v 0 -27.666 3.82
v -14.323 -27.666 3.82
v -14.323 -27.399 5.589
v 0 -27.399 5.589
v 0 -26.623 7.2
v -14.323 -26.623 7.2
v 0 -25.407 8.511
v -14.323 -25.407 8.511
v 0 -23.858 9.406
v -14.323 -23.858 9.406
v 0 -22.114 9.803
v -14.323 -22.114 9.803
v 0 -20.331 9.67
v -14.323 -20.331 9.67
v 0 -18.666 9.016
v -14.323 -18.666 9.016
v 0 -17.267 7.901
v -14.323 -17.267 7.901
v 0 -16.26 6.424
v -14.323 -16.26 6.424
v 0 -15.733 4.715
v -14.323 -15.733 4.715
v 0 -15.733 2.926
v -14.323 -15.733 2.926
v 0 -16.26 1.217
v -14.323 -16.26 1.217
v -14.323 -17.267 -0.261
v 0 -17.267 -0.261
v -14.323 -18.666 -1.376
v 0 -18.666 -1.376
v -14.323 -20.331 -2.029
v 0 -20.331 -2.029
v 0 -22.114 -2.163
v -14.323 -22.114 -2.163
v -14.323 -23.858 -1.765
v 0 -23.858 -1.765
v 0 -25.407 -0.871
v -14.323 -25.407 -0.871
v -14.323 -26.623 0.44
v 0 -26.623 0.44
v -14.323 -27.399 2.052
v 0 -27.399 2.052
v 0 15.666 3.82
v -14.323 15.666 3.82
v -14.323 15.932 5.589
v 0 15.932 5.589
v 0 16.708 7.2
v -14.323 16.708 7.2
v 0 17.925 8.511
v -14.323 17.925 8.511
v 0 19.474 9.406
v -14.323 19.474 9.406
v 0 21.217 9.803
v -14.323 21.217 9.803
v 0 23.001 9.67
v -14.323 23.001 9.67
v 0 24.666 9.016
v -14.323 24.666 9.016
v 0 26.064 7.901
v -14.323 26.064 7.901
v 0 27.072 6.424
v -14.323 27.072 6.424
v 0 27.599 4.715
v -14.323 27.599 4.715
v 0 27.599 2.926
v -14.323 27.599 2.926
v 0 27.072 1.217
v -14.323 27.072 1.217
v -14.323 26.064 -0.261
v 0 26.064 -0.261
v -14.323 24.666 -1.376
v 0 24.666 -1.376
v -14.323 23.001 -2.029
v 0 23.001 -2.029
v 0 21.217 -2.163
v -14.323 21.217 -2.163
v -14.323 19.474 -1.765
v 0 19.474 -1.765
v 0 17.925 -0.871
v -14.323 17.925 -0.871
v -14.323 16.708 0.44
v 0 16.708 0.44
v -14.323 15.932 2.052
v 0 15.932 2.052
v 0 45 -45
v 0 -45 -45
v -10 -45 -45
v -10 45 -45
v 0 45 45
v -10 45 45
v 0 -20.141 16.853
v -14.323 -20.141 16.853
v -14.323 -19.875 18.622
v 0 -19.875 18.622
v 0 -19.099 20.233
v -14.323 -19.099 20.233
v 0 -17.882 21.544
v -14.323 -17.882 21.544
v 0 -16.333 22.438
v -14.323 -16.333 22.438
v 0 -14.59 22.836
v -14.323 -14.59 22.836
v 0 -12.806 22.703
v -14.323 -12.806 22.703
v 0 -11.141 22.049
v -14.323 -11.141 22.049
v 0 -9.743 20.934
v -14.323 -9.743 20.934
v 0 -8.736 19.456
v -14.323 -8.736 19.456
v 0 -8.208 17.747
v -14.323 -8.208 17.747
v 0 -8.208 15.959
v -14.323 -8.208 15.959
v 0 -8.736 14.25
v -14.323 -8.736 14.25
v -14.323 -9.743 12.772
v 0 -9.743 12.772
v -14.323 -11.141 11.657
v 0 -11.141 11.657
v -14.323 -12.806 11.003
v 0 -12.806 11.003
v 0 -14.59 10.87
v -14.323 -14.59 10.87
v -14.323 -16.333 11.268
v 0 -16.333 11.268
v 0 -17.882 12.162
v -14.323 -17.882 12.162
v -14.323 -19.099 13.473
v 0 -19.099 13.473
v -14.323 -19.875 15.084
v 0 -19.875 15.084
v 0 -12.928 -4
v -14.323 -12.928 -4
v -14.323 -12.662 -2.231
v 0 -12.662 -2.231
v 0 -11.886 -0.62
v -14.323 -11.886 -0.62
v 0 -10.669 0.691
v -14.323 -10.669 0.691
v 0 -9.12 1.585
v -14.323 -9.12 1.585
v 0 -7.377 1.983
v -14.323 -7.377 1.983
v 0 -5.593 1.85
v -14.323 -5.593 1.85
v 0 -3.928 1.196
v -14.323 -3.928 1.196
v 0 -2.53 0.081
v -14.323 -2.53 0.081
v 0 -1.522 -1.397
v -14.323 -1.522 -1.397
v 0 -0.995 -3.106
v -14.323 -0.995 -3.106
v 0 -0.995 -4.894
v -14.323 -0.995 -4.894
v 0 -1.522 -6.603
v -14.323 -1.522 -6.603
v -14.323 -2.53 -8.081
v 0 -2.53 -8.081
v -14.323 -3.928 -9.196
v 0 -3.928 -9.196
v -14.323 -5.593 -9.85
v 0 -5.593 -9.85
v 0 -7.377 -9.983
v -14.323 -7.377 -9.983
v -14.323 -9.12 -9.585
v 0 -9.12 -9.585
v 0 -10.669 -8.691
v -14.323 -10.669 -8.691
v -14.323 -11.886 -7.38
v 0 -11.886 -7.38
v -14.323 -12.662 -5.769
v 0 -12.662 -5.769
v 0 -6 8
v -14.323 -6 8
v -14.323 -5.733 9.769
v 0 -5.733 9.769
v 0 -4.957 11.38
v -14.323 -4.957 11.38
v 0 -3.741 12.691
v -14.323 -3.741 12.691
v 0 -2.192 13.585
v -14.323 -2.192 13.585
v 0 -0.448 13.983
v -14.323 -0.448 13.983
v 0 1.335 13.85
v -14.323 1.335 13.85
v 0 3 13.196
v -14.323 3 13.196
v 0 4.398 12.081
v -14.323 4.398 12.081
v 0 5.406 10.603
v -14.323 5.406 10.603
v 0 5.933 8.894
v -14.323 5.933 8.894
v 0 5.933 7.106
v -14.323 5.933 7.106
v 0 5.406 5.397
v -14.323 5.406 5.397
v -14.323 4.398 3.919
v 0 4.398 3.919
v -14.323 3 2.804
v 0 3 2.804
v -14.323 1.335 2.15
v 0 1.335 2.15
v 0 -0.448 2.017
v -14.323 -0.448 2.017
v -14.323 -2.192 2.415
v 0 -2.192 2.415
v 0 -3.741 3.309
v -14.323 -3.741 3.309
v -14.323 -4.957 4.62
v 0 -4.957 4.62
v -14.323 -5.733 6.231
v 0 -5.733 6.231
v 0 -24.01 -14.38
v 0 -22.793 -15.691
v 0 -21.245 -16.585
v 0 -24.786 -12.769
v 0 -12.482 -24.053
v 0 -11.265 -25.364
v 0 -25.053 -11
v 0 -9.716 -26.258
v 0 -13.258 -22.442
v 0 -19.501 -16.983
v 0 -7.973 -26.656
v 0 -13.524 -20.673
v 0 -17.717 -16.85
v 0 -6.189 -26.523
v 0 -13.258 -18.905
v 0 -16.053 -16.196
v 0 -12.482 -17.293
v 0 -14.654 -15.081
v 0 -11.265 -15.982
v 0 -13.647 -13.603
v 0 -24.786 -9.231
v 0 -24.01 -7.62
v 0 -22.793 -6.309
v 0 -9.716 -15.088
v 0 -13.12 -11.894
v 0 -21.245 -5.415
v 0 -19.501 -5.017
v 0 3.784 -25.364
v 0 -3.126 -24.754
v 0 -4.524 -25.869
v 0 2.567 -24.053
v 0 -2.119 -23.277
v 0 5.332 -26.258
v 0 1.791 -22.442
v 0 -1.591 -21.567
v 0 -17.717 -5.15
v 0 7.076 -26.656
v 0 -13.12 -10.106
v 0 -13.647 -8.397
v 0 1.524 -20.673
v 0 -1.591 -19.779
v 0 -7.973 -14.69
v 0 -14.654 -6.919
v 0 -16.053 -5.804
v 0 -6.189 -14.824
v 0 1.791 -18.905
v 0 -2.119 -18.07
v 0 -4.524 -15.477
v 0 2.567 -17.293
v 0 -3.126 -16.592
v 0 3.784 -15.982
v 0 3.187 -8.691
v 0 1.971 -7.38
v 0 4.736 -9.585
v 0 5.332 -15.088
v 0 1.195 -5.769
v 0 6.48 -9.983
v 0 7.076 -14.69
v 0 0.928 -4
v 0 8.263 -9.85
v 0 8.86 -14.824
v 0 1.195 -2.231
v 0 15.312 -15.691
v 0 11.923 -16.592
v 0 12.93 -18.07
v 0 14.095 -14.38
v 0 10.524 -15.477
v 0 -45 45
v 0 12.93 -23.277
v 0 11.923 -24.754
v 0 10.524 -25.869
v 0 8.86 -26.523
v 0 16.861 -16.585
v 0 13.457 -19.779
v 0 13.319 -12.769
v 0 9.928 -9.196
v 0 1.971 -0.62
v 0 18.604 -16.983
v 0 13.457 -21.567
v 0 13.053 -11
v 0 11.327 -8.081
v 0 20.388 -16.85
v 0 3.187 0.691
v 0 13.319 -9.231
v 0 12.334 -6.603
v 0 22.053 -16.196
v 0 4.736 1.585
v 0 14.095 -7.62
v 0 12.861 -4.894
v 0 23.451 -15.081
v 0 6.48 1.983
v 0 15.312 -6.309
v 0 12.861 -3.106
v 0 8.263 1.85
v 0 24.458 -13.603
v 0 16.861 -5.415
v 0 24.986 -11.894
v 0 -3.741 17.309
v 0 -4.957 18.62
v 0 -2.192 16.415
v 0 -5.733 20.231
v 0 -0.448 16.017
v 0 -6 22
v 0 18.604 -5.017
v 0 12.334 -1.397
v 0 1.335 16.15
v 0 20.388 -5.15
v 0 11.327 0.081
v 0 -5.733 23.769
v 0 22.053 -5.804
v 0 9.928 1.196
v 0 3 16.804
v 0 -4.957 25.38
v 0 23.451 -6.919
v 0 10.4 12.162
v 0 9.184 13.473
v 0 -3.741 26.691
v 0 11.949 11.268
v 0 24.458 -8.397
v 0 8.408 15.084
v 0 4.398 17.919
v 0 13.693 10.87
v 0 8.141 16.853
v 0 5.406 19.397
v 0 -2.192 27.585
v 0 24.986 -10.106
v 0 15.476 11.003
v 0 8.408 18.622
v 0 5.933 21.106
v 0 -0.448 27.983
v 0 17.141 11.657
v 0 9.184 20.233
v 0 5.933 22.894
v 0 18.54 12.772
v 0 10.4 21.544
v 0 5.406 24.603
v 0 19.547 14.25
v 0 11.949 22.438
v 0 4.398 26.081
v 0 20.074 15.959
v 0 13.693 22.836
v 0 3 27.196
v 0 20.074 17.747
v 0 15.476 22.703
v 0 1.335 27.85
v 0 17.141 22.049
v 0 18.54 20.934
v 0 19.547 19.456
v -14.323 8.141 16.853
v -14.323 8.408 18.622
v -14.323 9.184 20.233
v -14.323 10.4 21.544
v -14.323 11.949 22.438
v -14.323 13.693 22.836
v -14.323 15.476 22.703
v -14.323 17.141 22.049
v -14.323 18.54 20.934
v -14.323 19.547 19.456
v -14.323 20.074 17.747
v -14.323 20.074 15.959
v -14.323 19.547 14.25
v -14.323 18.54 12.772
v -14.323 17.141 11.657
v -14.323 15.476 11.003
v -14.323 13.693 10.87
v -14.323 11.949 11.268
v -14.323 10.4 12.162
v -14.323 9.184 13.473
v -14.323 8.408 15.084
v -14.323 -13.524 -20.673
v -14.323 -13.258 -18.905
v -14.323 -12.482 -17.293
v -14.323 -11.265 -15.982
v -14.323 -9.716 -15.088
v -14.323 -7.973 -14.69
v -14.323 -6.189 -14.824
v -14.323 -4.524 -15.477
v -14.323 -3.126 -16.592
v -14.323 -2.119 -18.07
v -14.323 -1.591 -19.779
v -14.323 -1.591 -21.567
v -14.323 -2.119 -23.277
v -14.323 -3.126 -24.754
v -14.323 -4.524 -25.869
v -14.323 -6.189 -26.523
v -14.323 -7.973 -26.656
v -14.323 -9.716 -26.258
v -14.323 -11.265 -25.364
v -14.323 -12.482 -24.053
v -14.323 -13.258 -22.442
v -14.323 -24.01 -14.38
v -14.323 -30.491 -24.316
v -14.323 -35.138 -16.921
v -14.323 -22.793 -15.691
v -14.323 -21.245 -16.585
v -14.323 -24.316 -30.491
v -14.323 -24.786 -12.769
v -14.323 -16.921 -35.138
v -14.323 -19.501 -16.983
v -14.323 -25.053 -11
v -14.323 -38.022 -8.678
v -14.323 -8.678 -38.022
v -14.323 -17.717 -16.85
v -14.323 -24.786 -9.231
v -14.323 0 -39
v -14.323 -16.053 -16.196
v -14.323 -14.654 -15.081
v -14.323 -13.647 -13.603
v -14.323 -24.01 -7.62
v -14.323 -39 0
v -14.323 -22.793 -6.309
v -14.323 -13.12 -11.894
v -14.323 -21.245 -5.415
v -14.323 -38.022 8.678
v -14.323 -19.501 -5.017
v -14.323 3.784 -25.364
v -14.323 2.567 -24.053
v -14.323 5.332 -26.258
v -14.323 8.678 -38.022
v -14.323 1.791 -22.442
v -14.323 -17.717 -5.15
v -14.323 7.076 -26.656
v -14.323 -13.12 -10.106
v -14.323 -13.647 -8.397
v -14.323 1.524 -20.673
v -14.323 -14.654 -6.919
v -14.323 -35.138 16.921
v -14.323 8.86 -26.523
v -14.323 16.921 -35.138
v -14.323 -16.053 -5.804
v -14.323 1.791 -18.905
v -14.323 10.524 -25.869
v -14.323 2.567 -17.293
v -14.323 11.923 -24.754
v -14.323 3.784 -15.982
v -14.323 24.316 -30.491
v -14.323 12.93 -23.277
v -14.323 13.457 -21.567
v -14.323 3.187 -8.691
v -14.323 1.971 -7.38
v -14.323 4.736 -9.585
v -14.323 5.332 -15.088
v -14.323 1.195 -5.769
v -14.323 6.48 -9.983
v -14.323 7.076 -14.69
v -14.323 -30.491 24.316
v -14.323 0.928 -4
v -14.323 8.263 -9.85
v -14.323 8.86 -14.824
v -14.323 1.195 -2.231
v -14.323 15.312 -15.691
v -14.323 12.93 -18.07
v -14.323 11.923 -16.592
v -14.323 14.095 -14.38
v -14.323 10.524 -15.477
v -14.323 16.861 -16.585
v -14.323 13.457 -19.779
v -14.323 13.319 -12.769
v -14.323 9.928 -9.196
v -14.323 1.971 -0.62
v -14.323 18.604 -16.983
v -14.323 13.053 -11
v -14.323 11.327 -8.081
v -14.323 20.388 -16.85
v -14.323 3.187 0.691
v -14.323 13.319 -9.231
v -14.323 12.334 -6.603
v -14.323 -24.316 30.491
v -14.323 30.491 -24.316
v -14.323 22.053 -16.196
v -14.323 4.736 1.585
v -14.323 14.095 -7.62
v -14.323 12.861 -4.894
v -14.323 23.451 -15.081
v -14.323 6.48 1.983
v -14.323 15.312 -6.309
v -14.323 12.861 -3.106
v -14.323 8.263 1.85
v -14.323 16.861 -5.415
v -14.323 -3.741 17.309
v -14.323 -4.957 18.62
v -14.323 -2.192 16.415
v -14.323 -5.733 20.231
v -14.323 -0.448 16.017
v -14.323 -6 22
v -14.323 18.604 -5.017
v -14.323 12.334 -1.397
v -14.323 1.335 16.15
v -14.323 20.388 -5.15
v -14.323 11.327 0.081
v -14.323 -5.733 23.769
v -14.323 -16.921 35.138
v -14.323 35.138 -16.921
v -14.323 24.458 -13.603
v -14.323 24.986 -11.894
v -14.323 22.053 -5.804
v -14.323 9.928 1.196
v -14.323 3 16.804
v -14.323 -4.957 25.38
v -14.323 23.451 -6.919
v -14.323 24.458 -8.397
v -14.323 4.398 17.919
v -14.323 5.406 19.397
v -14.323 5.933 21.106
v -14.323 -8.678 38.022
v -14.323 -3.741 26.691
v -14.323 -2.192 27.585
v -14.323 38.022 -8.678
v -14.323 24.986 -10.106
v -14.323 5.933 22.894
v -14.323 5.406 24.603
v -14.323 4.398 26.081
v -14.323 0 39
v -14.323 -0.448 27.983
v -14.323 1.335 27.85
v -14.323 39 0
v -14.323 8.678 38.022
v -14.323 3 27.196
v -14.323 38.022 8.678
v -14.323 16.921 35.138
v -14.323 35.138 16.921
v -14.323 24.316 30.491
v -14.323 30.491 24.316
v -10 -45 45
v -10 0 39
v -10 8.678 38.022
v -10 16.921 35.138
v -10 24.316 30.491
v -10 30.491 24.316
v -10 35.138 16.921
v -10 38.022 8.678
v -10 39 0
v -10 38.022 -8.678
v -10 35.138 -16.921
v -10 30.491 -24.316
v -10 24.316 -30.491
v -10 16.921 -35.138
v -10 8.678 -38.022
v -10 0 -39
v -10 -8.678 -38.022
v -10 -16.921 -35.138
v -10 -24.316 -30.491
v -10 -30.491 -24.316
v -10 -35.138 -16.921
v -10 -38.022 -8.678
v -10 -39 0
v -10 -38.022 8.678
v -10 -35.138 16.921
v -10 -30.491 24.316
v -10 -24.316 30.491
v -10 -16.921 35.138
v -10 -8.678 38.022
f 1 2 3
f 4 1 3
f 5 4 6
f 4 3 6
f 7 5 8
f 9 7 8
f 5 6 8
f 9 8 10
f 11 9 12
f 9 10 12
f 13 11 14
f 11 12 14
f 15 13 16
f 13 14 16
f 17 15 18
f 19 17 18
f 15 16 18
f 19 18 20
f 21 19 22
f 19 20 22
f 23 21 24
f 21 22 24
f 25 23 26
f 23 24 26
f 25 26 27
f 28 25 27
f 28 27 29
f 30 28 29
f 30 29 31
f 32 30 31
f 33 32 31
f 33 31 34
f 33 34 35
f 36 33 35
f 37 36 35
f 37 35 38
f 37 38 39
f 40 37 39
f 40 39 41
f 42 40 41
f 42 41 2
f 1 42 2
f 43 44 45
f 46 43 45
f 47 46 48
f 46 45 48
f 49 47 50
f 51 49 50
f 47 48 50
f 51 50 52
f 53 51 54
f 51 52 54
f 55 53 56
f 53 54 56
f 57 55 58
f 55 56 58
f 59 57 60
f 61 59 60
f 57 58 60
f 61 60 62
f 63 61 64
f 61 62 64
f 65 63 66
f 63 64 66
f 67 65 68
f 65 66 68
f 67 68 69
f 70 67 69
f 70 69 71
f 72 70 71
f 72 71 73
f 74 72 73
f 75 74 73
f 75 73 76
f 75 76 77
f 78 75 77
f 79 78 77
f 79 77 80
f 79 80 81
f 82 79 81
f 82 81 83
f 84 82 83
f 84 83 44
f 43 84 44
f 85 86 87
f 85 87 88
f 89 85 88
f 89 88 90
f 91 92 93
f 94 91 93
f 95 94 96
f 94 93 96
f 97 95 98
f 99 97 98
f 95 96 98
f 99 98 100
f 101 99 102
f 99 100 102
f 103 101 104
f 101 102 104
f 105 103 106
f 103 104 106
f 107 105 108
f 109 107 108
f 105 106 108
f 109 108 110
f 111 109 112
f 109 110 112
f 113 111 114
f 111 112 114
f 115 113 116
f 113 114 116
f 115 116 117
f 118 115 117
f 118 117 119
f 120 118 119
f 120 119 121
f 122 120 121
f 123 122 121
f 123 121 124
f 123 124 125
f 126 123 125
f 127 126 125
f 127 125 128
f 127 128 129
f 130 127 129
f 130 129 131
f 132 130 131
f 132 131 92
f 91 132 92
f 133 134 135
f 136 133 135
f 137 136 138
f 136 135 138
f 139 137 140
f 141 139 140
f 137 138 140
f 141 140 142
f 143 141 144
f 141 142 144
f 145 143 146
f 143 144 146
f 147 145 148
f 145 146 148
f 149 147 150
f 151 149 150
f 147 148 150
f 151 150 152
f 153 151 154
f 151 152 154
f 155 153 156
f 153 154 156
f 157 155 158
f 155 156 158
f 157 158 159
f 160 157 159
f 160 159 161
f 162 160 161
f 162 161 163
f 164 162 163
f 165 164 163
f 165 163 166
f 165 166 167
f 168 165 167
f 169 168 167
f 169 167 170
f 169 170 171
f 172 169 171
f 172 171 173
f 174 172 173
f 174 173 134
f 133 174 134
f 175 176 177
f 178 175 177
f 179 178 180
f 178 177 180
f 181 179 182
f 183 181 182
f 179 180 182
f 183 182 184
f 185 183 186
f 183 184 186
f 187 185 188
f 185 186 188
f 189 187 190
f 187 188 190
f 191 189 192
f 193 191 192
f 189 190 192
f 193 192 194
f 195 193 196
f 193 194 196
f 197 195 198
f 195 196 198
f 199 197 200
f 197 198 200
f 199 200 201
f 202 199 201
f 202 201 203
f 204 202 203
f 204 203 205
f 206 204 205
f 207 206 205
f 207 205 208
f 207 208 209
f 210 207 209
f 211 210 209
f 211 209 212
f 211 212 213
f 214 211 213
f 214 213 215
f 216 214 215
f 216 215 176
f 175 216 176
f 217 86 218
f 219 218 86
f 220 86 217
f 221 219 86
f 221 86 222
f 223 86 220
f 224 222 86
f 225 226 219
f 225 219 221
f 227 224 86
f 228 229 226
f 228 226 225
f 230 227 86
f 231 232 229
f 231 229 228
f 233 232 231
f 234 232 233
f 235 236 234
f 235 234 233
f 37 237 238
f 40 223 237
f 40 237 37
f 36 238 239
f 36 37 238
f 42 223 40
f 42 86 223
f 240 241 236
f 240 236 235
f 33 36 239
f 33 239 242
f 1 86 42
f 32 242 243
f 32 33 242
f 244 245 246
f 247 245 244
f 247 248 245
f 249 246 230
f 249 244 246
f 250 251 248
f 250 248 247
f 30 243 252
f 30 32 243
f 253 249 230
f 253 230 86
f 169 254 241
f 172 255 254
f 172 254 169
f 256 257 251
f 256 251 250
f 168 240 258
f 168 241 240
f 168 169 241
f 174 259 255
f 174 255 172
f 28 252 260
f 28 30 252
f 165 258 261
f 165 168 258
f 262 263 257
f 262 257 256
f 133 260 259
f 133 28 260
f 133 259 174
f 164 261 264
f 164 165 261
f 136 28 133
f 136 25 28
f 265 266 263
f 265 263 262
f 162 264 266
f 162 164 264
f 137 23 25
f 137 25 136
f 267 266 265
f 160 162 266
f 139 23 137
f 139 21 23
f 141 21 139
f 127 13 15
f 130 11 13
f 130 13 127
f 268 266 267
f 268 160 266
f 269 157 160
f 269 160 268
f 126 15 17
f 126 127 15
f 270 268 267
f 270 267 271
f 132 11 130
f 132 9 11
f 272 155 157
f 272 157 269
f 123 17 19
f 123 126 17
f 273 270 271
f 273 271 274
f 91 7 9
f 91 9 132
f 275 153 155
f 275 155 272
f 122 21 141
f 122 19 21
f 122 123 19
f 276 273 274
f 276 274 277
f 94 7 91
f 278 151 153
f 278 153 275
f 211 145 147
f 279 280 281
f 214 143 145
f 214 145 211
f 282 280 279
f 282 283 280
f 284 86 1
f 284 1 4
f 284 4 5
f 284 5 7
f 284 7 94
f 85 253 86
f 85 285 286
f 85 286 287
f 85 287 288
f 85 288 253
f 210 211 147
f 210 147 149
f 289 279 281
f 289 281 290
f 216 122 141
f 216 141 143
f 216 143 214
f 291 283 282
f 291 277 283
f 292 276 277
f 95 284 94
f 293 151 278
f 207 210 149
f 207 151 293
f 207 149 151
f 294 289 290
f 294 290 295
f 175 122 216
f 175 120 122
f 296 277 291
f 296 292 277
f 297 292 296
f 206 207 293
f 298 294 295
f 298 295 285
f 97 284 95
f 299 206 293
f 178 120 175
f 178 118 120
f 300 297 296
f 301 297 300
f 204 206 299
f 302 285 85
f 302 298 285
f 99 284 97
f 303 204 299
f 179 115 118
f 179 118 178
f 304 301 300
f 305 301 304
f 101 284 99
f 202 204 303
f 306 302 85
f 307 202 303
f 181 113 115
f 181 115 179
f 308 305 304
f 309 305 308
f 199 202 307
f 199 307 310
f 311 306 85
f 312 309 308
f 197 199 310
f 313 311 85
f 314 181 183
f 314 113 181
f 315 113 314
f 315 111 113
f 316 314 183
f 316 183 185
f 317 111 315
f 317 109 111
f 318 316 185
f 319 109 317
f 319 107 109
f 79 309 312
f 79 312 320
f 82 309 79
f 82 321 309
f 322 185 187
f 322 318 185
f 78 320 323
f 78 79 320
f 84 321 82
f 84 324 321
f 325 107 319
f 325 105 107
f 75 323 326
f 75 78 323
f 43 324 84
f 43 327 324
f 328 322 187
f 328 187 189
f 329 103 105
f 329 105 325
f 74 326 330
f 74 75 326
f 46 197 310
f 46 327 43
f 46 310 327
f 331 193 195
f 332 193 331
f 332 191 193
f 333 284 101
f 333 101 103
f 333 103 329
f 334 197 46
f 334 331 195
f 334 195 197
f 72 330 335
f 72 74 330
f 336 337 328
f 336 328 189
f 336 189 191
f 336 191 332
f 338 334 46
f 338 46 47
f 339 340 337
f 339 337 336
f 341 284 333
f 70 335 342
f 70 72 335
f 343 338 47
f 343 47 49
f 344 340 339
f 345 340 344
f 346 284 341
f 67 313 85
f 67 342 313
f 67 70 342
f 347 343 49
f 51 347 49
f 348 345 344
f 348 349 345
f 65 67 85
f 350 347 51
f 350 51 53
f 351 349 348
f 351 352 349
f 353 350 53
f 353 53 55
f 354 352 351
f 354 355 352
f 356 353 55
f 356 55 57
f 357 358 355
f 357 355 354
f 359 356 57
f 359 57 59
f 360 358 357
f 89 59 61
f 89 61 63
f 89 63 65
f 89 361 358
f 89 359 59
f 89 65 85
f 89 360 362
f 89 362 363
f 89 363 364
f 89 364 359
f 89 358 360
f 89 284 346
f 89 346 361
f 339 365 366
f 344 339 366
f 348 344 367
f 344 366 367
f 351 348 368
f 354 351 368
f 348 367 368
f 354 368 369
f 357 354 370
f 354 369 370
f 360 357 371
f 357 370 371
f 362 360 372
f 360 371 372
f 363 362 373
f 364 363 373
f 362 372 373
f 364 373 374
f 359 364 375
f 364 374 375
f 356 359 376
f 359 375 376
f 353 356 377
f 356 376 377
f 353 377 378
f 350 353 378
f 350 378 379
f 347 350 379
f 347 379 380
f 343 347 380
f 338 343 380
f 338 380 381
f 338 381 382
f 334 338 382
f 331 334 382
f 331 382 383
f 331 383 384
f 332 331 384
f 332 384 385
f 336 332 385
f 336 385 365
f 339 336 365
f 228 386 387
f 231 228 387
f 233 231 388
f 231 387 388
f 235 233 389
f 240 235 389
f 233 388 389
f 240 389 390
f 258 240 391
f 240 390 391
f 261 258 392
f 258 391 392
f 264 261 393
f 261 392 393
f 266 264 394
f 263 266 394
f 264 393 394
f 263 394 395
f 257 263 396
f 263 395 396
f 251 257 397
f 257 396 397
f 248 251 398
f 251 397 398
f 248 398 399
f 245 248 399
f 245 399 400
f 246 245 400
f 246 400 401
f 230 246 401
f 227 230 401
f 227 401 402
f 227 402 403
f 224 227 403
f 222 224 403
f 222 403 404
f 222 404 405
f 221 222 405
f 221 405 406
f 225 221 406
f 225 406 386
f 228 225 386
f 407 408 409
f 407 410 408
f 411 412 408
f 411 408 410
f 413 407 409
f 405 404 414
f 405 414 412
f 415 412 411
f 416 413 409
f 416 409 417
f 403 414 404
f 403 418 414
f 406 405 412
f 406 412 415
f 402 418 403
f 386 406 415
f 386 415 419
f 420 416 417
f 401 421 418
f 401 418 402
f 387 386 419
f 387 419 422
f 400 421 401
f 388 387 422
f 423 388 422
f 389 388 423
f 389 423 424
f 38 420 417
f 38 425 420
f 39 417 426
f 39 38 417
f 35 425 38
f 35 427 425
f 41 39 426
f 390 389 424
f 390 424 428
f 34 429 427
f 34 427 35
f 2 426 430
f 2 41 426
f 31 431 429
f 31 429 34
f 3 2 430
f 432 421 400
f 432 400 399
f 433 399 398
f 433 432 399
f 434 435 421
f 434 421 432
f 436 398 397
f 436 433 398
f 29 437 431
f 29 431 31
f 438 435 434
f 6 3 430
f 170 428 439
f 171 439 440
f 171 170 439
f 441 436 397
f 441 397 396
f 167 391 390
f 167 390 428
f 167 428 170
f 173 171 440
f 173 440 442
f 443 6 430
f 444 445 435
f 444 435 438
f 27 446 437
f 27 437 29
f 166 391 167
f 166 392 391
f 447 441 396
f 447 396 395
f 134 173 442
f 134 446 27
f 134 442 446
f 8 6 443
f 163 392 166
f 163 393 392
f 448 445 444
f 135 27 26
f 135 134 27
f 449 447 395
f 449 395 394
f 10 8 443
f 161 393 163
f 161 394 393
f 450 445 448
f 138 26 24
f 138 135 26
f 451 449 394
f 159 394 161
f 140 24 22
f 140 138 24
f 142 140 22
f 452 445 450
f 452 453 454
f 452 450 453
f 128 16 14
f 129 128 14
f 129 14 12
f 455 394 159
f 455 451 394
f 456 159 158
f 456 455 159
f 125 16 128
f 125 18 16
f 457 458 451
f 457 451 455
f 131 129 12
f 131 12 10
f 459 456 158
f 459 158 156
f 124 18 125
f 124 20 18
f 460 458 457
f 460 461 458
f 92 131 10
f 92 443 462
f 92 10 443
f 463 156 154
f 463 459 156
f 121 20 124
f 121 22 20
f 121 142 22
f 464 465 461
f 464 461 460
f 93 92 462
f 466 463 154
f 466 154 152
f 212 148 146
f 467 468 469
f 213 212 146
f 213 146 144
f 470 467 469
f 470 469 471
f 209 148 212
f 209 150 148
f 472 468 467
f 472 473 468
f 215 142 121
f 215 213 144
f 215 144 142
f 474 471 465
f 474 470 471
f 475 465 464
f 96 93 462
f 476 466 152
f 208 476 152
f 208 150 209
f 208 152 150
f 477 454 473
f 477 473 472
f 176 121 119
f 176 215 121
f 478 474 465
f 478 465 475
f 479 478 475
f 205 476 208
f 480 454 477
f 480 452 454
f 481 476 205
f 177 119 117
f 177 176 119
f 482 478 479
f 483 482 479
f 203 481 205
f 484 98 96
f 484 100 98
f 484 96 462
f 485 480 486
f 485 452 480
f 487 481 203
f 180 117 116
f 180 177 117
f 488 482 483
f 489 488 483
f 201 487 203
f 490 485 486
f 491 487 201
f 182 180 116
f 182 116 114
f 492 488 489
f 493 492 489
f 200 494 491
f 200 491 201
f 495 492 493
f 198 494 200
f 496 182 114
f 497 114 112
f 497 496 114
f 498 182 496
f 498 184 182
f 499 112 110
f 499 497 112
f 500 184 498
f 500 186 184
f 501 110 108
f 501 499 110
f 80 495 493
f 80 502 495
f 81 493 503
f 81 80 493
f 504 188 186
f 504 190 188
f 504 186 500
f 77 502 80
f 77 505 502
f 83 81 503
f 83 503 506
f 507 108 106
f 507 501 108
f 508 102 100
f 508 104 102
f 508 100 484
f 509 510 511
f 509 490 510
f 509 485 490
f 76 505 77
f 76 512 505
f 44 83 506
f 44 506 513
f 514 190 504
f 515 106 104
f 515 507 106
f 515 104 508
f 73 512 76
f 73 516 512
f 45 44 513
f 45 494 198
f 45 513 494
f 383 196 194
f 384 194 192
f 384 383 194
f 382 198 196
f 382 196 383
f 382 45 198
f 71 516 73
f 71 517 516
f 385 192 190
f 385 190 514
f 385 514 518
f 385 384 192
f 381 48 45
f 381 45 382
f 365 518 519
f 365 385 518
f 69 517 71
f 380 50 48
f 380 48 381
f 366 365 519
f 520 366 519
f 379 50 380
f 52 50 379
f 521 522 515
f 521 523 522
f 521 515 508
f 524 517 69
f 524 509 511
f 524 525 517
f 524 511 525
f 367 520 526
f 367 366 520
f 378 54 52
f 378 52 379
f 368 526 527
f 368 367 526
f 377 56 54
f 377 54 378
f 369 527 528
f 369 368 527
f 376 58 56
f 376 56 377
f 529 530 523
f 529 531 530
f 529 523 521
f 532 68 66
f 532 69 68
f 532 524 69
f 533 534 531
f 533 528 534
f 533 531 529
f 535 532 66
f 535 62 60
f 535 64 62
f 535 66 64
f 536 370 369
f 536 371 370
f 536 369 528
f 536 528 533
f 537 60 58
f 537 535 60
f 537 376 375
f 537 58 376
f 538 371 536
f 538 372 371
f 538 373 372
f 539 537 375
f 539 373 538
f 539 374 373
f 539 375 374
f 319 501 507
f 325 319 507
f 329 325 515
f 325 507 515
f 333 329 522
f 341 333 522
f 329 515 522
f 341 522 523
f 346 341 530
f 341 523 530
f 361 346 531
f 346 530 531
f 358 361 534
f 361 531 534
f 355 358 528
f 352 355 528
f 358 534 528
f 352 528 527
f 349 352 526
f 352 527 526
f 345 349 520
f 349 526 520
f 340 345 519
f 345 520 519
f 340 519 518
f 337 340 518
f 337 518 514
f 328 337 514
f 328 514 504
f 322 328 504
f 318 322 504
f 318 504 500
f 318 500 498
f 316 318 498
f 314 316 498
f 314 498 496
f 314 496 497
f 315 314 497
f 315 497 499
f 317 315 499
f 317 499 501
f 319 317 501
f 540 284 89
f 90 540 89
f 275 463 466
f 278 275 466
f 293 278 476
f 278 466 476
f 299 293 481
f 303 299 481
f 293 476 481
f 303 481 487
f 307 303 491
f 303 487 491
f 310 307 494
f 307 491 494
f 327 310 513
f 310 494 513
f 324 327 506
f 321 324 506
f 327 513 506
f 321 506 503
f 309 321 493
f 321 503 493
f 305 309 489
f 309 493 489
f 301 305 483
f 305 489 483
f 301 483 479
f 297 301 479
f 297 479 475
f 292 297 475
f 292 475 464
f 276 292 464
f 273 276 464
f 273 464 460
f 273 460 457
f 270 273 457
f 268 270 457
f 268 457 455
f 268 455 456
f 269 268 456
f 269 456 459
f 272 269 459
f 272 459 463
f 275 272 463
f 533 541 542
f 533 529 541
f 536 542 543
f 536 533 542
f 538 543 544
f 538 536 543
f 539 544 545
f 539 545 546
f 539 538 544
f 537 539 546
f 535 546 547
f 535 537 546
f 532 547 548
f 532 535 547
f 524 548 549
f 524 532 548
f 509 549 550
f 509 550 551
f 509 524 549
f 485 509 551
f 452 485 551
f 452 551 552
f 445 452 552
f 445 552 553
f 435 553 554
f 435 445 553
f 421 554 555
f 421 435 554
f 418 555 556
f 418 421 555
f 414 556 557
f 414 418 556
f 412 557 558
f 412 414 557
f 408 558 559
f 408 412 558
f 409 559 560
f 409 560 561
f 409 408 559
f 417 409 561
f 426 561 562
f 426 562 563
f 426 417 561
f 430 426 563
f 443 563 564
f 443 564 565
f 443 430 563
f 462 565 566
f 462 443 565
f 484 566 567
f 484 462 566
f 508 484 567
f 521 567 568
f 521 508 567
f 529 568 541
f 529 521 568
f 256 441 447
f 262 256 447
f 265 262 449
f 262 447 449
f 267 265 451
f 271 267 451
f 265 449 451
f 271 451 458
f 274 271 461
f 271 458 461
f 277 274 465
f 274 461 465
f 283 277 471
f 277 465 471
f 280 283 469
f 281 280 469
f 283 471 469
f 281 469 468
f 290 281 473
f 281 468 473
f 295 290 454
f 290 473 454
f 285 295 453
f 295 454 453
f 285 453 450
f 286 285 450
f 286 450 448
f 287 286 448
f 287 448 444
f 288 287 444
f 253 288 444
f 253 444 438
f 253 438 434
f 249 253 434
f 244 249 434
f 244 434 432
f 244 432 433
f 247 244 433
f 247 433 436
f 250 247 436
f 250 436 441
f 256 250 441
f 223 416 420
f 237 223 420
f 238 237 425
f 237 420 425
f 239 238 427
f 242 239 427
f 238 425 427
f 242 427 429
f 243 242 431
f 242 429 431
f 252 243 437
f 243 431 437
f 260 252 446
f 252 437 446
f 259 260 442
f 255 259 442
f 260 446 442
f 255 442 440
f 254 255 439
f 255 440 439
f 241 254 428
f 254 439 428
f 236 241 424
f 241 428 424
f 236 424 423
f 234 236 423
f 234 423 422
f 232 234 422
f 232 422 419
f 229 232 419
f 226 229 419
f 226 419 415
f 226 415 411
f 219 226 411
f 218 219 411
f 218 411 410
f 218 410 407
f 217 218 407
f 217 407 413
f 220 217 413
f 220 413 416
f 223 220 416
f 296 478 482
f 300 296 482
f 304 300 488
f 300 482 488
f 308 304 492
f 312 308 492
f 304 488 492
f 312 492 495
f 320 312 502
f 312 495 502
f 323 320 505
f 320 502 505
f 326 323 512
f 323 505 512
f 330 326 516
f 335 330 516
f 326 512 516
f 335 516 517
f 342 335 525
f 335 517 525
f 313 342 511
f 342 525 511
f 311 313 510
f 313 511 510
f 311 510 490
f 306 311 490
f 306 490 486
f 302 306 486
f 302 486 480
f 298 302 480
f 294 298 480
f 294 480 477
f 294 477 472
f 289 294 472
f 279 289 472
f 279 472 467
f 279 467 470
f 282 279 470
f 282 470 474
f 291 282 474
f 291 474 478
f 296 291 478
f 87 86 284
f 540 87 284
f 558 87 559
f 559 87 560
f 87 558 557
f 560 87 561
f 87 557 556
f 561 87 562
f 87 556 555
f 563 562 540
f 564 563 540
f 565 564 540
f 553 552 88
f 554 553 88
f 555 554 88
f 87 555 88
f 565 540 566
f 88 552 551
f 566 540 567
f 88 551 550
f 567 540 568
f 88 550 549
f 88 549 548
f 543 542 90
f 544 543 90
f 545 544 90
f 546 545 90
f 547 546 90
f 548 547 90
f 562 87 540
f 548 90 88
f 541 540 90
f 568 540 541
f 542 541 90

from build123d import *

# Parameters (mm, degrees)
F2_W     = 90
F2_H     = 90
F3_DEPTH = 10
F4_D     = 12
F4_DEPTH = 20
F4_TIP   = 3.6051637142


# Not quite as in the source:
# - a feature names something its author has since deleted; it is built from what else it names


with BuildPart() as f1:
    # F0 (on Front) → F1 (revolve)
    with BuildSketch(Plane.XZ):
        Polygon((-14.3225658685, 0), (-10, 0), (-10, 32.5), (-10, 39), (-14.3225658685, 39), (-14.3225658685, 34.4556160271), (-14.3225658685, 32.5), align=None)
    revolve(axis=Axis((-45.5725640059, 0, 0), (-1, 0, 0)))

    # F2 (on Right) → F3 (join)
    with BuildSketch(Plane.YZ):
        Rectangle(F2_W, F2_H)
    extrude(amount=-F3_DEPTH)

    # F4
    with Locations(Plane.YZ):
        with Locations((-6.9282032303, -4), (6.9282032303, -4), (0, 8), (-21.6657705663, 3.8202599087), (-14.1413274131, 16.8529777486), (0, 22), (14.1413274131, 16.8529777486), (21.6657705663, 3.8202599087), (19.0525588833, -11), (7.5244431532, -20.6732376573), (-7.5244431532, -20.6732376573), (-19.0525588833, -11)):
            Hole(F4_D / 2, depth=F4_DEPTH)
            with Locations((0, 0, -(F4_DEPTH + F4_TIP / 2))):  # 118° drill point
                Cone(0, F4_D / 2, F4_TIP, mode=Mode.SUBTRACT)


solid = f1.part
